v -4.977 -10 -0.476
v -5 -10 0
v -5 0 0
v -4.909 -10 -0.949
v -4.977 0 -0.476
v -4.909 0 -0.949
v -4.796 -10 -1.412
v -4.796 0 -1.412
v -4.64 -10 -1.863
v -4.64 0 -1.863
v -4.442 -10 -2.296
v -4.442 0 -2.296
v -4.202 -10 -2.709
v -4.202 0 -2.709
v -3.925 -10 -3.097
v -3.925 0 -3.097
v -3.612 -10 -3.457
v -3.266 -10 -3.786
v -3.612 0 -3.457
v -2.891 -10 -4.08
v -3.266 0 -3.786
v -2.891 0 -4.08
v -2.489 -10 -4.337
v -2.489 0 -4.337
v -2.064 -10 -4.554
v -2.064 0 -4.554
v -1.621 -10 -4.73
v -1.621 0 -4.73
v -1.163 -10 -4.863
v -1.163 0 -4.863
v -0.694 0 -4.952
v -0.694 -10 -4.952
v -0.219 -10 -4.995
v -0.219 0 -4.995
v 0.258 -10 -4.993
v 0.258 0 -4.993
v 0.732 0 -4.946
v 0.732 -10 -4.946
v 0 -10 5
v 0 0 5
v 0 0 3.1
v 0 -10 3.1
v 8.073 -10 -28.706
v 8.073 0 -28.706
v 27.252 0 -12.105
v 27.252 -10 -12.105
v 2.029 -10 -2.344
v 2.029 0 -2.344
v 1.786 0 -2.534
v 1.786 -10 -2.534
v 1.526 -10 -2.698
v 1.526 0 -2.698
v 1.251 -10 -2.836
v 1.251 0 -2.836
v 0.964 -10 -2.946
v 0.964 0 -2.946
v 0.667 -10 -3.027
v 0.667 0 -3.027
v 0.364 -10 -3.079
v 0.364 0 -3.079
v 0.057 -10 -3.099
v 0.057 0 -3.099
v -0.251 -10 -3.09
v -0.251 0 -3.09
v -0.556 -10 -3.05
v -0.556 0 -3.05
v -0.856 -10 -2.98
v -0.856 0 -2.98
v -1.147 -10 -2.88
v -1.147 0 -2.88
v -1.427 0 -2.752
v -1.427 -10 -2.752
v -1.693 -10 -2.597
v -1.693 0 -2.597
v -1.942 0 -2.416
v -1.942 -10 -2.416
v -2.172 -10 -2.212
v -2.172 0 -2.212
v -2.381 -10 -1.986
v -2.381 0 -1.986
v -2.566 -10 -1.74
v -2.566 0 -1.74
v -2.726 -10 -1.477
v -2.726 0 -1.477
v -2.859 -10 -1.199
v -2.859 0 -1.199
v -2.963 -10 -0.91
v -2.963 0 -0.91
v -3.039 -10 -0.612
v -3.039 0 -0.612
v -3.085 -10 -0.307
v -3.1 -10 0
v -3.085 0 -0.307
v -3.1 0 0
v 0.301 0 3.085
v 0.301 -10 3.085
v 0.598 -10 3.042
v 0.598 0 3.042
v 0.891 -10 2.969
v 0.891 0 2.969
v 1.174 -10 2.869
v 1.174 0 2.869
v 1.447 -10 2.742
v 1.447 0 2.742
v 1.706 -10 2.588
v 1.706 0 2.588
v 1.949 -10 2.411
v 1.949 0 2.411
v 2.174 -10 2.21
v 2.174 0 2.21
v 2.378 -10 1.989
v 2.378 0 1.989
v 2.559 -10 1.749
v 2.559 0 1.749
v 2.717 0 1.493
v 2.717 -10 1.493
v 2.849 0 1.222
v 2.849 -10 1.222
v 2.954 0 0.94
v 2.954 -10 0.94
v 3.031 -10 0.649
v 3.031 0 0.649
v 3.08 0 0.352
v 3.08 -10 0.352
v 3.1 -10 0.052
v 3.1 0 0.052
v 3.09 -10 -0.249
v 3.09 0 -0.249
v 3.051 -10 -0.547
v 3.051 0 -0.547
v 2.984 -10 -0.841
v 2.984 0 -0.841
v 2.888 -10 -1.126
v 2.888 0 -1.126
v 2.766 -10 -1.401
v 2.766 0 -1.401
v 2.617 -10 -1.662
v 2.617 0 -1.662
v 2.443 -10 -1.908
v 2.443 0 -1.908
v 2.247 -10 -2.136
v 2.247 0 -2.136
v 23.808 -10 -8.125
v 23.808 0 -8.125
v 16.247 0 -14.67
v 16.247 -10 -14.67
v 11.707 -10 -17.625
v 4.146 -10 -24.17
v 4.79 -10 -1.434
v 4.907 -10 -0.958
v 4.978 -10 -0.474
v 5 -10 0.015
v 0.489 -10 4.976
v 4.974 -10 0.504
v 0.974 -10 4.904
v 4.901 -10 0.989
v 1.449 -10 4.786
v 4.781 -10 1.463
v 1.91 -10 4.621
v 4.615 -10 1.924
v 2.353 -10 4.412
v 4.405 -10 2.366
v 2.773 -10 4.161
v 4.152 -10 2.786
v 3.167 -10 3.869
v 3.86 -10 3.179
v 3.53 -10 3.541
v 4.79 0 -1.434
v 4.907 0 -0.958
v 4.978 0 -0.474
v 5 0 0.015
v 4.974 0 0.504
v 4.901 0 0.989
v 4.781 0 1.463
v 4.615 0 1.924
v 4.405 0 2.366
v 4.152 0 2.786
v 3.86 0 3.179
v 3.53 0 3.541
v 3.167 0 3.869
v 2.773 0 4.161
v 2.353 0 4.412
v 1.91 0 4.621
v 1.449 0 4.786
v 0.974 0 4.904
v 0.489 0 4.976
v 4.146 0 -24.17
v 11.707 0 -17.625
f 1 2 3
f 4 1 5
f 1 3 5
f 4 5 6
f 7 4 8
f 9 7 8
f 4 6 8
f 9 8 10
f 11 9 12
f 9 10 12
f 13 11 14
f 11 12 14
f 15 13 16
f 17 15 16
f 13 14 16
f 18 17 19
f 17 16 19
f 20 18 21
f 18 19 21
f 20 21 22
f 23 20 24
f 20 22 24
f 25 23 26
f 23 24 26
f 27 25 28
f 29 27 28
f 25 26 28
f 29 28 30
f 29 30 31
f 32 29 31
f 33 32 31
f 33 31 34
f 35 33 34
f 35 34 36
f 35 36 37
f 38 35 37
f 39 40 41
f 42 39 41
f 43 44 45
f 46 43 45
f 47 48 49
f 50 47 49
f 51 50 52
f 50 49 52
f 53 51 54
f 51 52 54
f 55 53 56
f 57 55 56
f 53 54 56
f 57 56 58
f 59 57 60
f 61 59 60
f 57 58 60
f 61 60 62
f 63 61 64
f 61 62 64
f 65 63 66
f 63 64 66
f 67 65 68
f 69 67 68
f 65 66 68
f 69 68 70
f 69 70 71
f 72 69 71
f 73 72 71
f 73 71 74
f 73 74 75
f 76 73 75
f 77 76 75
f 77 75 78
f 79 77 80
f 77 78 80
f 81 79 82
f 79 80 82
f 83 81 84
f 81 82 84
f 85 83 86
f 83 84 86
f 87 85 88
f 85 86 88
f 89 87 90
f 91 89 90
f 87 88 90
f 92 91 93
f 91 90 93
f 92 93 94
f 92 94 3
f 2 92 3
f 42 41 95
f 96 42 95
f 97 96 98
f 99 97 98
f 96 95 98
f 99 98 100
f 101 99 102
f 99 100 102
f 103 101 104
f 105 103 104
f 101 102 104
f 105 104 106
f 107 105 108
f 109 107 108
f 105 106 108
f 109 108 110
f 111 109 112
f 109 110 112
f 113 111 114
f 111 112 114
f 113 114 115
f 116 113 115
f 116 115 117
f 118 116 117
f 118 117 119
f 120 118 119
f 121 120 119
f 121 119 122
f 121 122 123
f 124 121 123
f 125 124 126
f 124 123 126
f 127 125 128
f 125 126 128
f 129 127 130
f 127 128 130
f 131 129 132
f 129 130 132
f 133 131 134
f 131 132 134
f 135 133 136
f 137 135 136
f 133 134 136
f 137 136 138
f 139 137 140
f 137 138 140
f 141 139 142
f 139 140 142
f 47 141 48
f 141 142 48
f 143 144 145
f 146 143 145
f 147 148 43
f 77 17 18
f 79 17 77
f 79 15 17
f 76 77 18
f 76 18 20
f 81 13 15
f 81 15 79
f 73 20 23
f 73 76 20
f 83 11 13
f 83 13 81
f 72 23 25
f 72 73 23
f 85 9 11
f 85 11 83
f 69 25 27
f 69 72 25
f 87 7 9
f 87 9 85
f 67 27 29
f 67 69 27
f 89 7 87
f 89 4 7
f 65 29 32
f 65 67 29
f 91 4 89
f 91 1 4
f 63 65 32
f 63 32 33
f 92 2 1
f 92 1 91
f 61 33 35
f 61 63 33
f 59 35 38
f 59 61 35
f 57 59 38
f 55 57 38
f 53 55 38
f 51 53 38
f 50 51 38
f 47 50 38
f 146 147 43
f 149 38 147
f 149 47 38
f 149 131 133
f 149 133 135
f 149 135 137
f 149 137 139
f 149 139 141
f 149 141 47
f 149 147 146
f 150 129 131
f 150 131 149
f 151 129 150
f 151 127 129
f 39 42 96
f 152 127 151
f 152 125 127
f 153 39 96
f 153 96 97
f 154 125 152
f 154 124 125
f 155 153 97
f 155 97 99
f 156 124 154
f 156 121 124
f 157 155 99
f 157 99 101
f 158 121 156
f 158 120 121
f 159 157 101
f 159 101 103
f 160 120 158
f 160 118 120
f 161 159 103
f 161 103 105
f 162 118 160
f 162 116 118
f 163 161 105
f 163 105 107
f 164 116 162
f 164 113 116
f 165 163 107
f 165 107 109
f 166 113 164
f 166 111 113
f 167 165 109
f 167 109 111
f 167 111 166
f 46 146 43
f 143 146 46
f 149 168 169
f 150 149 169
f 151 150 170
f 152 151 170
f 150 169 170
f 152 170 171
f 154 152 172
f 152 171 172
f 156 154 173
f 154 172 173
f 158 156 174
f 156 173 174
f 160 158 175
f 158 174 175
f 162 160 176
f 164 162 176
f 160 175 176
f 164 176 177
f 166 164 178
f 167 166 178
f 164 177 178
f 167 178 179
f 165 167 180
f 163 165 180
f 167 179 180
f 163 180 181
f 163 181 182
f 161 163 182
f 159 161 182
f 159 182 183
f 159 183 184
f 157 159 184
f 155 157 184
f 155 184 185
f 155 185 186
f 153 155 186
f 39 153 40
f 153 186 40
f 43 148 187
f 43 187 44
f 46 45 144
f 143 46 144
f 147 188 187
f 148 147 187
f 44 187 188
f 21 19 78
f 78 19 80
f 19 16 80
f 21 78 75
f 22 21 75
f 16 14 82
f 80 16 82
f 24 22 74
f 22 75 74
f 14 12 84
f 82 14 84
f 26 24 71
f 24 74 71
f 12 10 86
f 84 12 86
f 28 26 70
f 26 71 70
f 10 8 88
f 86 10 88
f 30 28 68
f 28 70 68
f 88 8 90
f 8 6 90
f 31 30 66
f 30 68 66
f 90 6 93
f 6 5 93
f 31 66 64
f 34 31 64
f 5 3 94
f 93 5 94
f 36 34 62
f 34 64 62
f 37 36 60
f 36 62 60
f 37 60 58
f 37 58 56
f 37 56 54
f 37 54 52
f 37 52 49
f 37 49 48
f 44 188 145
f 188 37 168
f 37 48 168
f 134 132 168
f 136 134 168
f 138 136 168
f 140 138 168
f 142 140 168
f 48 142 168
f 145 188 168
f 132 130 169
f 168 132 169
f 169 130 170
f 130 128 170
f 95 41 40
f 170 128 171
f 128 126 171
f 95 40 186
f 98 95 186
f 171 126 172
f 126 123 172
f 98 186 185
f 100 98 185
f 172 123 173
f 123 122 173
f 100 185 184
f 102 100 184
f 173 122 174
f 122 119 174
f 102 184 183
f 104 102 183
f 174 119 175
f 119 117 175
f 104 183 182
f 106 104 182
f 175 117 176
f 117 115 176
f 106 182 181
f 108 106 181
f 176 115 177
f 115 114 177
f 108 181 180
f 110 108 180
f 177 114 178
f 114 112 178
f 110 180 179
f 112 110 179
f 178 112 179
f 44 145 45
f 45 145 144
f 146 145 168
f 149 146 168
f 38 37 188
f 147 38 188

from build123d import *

# Parameters (mm, degrees)
F1_DEPTH = 10


with BuildPart() as f1:
    # F0 (on Front) → F1 (new body)
    with BuildSketch(Plane.XZ):
        with BuildLine():
            ThreePointArc((2.028823, -2.343902), (-1.288536, -2.819517), (-3.1, 0))
            Line((-3.1, 0), (-4.1, 0))
            Line((-4.1, 0), (-5, 0))
            ThreePointArc((-5, 0), (-3.266365, -3.785612), (0.732343, -4.946077))
            Line((0.732343, -4.946077), (11.706972, -17.625082))
            Line((11.706972, -17.625082), (4.145997, -24.169672))
            Line((4.145997, -24.169672), (8.072751, -28.706257))
            Line((8.072751, -28.706257), (27.252344, -12.104882))
            Line((27.252344, -12.104882), (23.807724, -8.125308))
            Line((23.807724, -8.125308), (16.246749, -14.669898))
            Line((16.246749, -14.669898), (4.789988, -1.433882))
            ThreePointArc((4.789988, -1.433882), (4.010574, 2.985849), (0, 5))
            Line((0, 5), (0, 4.1))
            Line((0, 4.1), (0, 3.1))
            ThreePointArc((0, 3.1), (2.904832, 1.082567), (2.028823, -2.343902))
        make_face()
    extrude(amount=F1_DEPTH)


solid = f1.part
